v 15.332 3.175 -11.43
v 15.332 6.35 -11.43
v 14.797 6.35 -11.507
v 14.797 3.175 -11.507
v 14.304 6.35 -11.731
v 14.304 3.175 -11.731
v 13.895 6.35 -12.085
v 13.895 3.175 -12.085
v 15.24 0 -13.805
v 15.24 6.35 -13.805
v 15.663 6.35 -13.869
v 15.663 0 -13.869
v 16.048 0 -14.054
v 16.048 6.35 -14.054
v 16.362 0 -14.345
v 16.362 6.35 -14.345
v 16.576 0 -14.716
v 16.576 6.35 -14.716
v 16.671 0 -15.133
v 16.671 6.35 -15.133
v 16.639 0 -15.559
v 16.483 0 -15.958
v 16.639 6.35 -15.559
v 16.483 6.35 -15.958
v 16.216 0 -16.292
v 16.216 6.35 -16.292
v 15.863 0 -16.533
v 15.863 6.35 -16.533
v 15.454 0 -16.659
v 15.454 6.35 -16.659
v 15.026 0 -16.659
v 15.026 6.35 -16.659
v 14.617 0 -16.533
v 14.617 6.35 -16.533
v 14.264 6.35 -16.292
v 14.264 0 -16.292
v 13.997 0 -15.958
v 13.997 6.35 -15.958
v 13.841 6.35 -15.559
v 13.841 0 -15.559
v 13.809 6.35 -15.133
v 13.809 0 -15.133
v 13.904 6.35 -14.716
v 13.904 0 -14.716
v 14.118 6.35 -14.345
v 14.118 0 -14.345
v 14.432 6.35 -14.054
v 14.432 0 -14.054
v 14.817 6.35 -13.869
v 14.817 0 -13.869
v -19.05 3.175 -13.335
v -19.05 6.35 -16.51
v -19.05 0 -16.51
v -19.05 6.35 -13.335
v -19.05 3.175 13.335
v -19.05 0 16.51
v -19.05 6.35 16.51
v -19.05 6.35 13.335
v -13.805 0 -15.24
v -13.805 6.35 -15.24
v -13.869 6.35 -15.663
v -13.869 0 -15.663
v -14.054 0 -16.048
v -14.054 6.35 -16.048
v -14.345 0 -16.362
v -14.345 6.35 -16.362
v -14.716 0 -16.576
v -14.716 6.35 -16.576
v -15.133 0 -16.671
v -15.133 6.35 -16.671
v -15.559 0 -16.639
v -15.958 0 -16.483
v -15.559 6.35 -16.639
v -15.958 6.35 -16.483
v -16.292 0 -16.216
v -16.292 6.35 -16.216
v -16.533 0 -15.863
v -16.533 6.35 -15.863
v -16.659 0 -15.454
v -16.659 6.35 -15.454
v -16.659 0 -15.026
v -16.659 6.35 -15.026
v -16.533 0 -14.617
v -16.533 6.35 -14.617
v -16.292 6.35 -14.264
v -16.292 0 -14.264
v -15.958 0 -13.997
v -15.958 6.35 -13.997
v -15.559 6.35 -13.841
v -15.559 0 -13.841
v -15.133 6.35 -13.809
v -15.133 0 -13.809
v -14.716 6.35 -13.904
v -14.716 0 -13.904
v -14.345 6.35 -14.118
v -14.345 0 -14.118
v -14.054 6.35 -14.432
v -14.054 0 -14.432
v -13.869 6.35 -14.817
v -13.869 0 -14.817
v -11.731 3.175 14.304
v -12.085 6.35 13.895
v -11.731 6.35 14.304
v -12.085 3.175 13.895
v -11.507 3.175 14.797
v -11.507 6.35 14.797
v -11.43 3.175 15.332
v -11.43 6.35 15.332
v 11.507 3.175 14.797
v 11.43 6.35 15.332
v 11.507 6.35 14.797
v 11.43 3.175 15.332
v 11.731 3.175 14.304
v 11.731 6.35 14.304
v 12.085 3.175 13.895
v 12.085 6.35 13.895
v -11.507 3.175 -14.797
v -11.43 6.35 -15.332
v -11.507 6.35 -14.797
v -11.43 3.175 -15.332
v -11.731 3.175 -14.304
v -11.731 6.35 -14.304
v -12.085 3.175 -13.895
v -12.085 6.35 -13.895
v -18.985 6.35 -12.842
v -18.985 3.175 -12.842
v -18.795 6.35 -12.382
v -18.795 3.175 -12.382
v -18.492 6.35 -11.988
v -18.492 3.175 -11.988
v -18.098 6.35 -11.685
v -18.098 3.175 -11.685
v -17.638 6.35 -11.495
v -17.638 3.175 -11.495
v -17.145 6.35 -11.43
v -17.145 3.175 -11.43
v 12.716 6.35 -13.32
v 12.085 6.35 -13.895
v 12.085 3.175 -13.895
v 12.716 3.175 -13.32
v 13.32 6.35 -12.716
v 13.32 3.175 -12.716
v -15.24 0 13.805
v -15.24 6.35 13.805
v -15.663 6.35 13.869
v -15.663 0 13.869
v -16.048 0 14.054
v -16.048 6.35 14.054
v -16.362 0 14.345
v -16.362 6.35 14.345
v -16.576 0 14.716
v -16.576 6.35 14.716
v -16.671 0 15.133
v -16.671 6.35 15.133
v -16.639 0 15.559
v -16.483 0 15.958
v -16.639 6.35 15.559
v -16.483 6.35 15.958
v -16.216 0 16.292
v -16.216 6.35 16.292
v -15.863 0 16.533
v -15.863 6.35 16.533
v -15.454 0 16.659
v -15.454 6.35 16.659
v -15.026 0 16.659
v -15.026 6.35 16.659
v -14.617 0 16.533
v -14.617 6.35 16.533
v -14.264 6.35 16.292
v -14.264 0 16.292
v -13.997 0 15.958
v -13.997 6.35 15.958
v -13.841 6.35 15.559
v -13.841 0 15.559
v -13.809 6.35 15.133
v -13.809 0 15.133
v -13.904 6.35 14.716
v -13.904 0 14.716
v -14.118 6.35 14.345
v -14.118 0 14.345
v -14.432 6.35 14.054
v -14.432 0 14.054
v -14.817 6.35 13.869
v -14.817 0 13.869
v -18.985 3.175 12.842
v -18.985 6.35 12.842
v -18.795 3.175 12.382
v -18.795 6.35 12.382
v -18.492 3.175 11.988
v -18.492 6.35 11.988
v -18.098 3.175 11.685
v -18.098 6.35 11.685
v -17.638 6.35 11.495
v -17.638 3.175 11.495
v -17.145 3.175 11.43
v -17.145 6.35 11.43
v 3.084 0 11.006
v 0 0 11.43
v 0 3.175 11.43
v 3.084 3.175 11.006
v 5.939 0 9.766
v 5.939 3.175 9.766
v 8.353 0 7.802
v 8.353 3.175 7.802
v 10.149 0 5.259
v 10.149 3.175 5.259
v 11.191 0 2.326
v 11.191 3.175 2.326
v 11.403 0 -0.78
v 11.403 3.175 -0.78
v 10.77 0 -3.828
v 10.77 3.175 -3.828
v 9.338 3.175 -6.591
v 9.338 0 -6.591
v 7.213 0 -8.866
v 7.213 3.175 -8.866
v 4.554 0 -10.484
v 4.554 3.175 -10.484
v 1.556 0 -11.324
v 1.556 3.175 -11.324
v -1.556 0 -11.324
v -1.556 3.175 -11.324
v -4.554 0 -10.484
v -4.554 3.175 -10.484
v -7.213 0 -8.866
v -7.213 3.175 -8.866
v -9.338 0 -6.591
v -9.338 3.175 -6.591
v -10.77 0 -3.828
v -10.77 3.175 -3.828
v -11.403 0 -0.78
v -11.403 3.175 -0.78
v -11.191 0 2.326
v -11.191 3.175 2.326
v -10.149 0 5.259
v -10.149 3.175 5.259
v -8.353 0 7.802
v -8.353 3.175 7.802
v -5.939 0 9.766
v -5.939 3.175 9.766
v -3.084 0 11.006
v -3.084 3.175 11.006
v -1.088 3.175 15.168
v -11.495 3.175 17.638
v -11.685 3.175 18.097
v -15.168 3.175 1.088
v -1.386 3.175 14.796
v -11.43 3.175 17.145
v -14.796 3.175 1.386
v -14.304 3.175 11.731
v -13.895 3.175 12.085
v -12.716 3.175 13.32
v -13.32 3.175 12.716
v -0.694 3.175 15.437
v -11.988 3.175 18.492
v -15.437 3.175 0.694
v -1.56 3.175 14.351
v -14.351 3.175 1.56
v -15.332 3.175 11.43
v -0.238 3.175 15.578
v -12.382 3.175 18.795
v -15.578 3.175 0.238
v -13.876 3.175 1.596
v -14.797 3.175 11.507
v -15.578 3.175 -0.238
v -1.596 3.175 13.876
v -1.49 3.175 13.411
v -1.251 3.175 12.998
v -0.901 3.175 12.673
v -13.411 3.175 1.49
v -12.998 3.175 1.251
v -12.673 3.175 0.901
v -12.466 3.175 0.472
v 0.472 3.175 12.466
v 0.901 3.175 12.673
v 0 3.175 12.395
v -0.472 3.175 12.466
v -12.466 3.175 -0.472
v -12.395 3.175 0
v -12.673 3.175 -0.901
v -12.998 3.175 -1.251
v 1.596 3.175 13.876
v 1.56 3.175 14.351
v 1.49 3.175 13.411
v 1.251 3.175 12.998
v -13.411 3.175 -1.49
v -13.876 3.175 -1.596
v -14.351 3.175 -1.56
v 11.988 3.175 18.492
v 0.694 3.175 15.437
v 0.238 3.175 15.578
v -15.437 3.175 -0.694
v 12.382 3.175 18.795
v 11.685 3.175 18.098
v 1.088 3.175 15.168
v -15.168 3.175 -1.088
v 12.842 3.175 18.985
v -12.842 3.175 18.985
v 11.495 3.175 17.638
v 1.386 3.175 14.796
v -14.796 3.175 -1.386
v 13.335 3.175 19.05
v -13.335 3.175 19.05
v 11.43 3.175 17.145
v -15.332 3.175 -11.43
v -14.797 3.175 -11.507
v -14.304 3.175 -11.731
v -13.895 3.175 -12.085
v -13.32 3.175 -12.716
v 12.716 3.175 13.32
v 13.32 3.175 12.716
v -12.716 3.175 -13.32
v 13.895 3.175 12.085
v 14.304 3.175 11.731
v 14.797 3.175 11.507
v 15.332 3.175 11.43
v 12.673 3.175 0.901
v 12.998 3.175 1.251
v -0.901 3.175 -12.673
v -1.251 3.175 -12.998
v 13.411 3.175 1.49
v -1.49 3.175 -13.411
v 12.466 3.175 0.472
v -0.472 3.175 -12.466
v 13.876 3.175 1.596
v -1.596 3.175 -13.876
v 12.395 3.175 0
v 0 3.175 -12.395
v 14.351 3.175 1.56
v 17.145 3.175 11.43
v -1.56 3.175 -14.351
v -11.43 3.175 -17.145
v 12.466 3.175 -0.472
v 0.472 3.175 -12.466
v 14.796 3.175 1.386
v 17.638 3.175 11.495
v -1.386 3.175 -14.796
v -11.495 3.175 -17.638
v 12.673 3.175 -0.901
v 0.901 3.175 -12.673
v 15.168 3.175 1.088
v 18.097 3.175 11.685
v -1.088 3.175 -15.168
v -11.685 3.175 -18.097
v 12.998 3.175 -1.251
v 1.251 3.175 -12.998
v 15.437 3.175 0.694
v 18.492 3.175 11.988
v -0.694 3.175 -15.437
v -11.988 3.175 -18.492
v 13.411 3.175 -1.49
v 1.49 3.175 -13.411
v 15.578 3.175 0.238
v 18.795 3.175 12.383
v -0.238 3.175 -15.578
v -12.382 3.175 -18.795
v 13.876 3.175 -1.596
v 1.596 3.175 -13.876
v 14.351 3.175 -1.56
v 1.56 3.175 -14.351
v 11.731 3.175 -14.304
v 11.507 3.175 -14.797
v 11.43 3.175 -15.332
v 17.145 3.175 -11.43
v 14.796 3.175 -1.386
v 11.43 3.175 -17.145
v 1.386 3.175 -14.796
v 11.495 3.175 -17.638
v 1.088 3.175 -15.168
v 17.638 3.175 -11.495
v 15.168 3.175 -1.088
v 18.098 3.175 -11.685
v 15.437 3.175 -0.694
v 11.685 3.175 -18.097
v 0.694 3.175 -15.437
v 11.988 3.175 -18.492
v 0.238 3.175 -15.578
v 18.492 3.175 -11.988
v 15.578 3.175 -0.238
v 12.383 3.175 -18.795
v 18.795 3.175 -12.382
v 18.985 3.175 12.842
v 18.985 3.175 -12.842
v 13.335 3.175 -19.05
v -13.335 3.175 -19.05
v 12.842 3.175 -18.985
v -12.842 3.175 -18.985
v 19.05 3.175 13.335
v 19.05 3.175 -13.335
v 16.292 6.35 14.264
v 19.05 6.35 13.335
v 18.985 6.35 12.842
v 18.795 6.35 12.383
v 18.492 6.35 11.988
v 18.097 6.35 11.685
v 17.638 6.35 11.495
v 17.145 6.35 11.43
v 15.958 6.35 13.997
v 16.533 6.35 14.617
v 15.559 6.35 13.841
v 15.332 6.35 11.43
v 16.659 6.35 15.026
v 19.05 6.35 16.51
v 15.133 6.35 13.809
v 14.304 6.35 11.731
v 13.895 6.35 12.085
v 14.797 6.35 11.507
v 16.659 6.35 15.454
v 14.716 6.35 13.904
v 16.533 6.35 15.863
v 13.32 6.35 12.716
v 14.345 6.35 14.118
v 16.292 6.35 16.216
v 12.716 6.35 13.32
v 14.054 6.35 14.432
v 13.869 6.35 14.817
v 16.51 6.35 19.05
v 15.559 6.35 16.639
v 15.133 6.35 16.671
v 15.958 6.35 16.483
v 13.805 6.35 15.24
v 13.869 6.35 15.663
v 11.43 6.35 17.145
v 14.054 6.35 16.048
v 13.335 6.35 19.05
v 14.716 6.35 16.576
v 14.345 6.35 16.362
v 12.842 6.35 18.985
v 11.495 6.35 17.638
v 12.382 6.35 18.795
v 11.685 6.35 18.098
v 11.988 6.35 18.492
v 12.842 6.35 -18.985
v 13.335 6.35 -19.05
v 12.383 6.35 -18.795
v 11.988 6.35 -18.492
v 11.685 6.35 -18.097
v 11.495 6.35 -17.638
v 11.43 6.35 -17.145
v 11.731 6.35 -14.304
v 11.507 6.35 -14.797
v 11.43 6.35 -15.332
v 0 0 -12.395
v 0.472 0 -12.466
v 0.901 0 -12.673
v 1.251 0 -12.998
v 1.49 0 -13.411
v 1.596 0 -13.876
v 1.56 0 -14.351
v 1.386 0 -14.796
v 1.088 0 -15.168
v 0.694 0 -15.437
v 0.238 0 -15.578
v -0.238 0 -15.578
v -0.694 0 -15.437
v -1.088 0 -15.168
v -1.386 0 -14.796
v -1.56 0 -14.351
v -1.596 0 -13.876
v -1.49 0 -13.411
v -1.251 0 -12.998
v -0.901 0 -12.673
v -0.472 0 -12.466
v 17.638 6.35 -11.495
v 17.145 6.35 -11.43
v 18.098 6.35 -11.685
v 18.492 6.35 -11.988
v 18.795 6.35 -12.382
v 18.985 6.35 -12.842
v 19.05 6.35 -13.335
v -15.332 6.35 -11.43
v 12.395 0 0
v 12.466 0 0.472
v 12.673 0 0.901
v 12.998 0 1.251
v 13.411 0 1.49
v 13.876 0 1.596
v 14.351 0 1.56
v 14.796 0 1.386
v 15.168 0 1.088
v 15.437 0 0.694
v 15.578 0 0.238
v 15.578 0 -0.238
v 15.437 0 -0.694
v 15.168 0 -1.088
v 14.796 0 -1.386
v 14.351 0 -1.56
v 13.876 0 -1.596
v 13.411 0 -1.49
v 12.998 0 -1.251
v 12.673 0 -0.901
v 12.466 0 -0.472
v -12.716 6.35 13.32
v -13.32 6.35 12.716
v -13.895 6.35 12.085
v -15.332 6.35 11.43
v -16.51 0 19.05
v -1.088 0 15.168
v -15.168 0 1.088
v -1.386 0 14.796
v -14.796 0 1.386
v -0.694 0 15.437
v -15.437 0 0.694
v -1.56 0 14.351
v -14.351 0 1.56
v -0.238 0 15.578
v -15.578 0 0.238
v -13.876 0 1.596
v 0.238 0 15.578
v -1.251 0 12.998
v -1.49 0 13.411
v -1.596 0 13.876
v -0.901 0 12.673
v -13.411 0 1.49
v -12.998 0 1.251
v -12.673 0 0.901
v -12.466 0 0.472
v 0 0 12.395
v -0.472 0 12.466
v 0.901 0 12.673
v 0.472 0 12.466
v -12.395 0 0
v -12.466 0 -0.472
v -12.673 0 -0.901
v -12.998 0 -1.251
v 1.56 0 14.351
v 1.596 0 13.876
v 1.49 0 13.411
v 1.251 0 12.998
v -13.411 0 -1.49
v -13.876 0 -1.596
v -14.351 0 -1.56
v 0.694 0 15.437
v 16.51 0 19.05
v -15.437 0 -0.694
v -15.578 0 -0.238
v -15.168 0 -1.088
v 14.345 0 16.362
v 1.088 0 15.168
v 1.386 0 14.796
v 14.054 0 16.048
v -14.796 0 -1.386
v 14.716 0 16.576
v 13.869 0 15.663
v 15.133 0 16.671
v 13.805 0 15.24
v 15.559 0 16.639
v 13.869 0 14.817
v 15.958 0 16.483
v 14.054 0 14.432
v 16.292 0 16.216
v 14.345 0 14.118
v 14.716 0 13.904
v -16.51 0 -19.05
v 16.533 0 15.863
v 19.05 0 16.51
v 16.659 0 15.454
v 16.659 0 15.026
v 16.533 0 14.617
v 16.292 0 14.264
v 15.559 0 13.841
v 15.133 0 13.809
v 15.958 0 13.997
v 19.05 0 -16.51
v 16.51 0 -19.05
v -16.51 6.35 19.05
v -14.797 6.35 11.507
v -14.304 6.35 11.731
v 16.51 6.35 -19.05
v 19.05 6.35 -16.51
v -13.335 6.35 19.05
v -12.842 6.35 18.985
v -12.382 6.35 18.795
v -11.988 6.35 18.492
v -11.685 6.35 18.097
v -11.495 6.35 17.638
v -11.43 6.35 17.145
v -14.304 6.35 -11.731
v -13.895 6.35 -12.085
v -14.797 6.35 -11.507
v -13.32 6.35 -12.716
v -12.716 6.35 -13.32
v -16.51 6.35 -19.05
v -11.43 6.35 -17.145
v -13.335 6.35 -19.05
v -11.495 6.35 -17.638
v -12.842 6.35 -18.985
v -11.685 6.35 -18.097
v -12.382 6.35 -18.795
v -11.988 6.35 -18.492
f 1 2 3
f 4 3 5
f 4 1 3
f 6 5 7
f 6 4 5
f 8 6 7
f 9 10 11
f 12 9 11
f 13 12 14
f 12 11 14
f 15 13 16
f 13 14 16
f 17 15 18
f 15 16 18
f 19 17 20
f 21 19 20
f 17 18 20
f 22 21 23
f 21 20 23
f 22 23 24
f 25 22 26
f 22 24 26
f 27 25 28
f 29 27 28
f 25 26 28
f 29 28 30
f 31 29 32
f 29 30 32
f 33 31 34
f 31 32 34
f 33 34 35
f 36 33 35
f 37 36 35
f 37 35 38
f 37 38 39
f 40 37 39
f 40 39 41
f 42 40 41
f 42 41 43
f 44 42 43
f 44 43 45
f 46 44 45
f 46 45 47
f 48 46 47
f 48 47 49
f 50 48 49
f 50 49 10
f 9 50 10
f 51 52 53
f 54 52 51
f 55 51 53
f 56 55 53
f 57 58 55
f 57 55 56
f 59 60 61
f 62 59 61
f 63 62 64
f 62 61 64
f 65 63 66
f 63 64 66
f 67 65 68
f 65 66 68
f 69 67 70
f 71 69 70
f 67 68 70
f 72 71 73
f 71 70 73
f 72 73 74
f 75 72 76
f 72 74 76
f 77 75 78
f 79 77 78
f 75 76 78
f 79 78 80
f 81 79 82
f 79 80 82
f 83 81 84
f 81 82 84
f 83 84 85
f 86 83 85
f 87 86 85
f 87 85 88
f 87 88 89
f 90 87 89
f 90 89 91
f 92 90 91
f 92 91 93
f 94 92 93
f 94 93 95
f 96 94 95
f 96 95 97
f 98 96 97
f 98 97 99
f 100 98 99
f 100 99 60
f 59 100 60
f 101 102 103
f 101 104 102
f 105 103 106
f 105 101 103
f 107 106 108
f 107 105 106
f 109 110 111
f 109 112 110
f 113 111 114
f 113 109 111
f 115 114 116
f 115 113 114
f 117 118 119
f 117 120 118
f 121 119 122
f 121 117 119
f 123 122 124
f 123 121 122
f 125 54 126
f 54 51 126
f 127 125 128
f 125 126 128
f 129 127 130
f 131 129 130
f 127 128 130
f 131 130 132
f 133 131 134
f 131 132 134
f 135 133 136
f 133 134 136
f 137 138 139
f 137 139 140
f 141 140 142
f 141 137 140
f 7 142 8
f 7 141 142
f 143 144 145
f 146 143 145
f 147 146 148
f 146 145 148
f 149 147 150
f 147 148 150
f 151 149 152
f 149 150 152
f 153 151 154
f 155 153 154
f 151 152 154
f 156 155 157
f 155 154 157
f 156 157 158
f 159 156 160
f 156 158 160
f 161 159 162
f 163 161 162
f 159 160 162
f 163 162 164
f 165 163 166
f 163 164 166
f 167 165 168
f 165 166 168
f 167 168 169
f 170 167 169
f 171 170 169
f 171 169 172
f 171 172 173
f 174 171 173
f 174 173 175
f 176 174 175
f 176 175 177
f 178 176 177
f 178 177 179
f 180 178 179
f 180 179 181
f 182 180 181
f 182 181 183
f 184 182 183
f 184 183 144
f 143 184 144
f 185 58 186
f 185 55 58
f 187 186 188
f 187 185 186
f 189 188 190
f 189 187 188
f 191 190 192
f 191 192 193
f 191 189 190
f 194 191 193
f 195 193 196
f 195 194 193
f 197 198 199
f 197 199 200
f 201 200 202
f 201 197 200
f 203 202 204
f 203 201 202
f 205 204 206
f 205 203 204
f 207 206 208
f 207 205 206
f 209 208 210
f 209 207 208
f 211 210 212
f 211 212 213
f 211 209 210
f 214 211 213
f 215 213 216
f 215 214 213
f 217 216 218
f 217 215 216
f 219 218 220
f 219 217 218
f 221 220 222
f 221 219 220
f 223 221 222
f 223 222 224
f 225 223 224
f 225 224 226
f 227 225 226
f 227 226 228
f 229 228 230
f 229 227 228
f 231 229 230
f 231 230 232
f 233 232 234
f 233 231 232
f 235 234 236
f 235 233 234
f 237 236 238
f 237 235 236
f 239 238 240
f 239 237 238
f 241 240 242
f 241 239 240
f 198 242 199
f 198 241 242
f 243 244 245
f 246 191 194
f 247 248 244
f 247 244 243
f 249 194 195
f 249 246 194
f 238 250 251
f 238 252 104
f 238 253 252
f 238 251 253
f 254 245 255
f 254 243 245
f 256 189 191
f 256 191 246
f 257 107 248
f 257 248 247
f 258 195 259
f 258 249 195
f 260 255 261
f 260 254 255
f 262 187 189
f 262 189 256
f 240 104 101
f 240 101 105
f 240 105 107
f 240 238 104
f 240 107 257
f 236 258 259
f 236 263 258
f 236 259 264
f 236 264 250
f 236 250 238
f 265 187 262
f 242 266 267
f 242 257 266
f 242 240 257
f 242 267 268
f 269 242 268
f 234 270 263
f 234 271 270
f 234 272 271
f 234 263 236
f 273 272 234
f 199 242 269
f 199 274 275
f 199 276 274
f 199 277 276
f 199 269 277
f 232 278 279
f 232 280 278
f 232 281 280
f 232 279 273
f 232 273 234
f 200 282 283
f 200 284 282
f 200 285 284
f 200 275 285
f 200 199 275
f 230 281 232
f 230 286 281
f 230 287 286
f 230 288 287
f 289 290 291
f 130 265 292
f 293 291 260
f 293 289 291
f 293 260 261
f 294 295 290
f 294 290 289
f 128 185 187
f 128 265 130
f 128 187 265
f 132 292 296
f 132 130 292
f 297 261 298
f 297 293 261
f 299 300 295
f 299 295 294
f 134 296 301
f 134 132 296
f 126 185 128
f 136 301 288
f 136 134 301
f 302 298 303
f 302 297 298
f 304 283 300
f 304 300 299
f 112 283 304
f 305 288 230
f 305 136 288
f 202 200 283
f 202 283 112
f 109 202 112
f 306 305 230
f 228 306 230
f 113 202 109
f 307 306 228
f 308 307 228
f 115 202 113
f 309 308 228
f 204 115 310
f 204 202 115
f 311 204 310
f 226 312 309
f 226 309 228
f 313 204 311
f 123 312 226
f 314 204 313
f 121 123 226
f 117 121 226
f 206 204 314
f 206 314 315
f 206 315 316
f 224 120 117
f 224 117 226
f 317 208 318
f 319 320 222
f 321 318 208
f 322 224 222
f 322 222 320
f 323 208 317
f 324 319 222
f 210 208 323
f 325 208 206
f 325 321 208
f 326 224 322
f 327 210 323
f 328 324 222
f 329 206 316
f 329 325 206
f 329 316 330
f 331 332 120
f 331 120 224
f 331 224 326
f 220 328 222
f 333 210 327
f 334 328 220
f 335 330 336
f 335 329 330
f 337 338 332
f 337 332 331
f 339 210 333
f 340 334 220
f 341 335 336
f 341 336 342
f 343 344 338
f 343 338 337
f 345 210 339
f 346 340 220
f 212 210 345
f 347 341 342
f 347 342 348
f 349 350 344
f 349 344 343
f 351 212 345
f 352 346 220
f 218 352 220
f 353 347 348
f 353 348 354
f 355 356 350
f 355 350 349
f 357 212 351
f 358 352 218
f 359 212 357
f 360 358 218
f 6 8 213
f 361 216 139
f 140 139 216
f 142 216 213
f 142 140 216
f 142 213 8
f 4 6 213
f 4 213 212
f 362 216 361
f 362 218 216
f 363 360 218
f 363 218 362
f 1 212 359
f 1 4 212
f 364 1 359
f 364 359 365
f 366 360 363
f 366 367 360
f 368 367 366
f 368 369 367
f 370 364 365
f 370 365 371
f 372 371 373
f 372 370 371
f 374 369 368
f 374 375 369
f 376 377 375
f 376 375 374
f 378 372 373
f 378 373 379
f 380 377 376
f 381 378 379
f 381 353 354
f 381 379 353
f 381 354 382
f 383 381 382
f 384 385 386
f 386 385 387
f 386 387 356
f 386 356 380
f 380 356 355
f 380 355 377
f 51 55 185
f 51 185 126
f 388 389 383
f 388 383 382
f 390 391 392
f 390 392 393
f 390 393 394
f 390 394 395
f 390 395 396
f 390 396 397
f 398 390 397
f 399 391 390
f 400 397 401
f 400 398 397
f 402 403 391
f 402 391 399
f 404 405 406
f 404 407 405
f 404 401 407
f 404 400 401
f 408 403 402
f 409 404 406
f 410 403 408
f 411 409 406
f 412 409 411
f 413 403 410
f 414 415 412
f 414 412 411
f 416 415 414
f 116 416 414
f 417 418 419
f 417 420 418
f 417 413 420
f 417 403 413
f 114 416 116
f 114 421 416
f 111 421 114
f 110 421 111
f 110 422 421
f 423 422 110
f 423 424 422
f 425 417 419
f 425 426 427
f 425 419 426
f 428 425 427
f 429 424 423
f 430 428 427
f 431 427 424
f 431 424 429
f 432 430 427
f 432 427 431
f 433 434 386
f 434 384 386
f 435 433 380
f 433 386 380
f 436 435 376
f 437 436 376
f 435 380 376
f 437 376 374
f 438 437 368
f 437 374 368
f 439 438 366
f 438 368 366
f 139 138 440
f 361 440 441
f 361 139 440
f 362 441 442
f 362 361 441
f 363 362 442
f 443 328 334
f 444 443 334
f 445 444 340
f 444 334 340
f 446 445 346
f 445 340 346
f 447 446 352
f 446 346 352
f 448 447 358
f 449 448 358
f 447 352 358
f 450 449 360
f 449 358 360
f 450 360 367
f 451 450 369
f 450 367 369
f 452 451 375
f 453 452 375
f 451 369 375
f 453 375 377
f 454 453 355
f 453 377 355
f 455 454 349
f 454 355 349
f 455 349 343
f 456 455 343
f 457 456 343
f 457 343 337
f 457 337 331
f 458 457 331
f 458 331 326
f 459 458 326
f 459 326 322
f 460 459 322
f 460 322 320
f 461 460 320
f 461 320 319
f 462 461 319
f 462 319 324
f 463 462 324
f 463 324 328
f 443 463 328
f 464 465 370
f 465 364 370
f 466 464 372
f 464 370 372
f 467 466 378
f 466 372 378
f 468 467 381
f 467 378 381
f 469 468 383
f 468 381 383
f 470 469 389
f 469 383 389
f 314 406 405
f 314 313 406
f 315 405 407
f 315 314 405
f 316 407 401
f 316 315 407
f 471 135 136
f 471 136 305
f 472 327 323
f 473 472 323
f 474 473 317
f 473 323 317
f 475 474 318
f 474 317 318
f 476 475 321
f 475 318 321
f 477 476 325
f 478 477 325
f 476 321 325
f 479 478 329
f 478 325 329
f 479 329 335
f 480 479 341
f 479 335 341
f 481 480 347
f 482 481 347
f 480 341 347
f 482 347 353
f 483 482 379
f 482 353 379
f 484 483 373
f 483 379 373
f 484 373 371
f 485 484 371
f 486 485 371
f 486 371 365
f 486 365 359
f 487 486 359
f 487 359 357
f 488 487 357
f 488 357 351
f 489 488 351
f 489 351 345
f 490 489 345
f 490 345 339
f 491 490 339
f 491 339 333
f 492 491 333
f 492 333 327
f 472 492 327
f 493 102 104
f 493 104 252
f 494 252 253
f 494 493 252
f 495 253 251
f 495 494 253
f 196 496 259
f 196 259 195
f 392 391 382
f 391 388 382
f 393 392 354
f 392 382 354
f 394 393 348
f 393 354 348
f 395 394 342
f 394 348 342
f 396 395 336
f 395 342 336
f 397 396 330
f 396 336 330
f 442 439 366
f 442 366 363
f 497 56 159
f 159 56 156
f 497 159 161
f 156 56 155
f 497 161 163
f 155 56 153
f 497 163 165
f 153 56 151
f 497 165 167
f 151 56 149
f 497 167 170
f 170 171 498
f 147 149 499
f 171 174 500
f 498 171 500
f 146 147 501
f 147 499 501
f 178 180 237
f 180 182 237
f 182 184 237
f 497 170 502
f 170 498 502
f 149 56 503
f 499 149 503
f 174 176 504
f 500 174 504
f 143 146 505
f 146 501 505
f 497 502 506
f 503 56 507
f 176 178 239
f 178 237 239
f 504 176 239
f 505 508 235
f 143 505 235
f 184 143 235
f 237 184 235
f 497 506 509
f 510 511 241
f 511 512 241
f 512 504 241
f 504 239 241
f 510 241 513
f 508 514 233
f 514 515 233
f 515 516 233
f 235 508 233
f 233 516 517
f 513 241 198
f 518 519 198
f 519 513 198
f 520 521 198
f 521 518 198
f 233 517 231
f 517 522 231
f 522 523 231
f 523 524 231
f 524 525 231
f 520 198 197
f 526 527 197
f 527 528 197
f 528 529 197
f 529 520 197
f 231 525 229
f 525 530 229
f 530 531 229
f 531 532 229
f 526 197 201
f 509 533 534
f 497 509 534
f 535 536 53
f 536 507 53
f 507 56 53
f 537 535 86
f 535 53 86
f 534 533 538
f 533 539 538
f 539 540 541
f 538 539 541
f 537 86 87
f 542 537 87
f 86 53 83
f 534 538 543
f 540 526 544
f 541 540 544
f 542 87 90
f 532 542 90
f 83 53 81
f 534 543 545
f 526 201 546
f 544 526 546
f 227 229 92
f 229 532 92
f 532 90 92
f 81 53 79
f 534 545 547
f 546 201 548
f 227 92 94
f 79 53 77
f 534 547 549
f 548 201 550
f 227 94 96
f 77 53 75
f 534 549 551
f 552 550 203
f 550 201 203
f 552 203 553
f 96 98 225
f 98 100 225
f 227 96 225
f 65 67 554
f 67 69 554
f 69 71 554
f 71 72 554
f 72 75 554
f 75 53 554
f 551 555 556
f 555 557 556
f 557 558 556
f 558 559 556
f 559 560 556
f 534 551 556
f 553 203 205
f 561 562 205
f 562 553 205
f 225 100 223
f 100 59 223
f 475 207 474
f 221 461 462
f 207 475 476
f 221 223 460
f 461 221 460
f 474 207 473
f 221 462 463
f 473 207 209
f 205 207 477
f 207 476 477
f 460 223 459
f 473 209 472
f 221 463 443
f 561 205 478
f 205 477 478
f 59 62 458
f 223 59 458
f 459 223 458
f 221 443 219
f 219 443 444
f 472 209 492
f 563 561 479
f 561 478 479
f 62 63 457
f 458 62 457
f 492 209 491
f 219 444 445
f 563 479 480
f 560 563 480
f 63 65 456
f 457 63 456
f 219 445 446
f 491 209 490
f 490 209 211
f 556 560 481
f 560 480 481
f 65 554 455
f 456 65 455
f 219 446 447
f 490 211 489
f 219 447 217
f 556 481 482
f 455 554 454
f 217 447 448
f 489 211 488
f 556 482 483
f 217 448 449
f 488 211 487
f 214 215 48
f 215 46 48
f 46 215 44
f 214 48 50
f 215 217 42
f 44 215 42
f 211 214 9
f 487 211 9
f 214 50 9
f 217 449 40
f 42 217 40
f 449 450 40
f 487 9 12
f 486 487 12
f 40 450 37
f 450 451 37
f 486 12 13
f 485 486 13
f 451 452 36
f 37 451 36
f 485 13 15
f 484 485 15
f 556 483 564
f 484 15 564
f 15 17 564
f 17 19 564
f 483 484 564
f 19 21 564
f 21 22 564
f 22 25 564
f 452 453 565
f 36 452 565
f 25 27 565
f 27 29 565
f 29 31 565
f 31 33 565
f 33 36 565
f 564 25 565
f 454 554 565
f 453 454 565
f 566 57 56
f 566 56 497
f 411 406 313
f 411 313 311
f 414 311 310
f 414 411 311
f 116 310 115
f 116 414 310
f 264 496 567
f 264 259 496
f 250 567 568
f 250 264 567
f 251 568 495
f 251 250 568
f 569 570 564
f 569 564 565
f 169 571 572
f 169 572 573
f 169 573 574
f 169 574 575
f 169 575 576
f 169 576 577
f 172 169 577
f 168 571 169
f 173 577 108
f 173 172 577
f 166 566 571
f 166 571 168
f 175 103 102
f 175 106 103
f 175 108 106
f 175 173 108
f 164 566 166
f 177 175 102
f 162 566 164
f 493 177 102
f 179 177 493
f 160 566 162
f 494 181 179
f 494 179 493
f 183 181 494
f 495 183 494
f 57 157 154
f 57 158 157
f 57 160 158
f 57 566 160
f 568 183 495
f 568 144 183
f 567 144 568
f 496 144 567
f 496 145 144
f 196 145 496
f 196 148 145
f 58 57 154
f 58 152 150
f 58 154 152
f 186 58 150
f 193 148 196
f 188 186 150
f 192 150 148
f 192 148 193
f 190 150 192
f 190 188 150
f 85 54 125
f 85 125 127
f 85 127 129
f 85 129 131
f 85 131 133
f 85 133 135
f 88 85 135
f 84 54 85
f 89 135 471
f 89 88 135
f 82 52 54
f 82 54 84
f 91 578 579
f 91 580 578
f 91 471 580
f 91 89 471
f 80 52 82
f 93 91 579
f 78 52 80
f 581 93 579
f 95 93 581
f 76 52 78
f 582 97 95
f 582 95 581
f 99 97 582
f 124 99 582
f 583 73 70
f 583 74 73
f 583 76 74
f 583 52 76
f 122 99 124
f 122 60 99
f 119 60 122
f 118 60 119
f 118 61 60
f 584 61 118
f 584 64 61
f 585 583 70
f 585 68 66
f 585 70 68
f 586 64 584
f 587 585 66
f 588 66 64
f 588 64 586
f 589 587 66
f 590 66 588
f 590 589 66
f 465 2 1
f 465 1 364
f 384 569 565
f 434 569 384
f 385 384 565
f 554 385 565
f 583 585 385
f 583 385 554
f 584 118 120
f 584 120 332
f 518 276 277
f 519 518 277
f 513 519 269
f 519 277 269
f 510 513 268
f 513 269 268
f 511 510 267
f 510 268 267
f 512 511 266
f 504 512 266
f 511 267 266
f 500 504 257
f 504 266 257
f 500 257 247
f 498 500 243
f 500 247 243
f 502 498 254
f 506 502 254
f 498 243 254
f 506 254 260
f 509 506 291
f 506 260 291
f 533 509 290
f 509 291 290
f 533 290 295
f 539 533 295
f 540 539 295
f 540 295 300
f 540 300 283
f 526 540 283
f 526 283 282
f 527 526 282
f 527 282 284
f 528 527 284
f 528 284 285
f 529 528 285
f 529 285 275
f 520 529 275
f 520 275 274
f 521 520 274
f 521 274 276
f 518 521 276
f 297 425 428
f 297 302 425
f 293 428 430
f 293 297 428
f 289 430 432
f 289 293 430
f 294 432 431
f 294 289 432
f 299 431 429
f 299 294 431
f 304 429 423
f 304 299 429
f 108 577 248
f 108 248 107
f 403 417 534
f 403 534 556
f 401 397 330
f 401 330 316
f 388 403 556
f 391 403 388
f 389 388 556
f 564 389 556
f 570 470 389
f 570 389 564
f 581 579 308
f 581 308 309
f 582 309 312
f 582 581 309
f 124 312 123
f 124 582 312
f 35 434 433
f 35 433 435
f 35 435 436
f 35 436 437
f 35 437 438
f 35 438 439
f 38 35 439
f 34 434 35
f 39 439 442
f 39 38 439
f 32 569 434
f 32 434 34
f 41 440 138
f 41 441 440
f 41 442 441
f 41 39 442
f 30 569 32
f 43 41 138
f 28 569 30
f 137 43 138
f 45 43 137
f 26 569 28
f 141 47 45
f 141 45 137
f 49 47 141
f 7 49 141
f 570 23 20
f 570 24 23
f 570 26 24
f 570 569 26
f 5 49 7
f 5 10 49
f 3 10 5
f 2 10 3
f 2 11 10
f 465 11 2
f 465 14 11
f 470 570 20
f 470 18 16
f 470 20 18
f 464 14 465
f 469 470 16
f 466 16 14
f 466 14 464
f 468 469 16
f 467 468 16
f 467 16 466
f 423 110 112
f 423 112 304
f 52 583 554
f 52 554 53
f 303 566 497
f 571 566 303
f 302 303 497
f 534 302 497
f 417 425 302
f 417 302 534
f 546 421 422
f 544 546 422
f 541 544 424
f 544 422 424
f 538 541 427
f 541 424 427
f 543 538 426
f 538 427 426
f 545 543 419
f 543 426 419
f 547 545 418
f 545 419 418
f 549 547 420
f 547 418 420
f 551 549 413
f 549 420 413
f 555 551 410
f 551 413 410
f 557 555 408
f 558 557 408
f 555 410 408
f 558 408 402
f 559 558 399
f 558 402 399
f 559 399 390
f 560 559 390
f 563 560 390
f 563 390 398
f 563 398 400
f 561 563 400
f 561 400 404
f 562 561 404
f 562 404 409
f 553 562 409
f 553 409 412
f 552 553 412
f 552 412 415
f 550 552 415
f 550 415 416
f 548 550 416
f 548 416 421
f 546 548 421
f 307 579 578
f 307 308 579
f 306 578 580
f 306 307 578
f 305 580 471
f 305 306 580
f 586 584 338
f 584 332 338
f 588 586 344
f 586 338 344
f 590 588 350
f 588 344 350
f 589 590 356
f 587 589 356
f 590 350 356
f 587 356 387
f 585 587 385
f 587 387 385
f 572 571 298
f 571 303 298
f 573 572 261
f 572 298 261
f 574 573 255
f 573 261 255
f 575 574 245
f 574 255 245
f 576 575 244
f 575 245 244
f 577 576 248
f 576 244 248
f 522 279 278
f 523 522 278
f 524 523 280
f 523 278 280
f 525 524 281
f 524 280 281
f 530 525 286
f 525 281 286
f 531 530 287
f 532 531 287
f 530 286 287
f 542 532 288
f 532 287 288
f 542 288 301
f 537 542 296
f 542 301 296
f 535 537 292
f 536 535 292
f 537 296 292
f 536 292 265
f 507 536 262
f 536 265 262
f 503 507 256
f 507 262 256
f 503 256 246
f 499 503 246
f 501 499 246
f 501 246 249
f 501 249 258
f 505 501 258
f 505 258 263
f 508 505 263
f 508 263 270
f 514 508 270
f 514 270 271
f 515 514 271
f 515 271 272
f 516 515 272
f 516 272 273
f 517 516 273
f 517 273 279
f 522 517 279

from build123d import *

# Parameters (mm, degrees)
SKETCH1_W                = 38.1
SKETCH1_H                = 38.1
SKETCH1_R                = 11.43
BOSS_EXTRUDE1_DEPTH      = 3.175
SKETCH2_R                = 1.6002
SKETCH2_R_2              = 1.4351
CUT_EXTRUDE1_DEPTH       = 28.127211891
CIRPATTERN1_COUNT        = 4
CHAMFER1_SIZE            = 2.54
BOSS_EXTRUDE2_START      = 3.175
SKETCH3_R                = 1.4351
BOSS_EXTRUDE2_DEPTH      = 3.175
FILLET1_R                = 1.905
CIRPATTERN7_COUNT        = 4
FILLET1_OF_CIRPATTERN7_R = 1.905


with BuildPart() as part:
    # Sketch1 → Boss-Extrude1 (new body)
    with BuildSketch(Plane(origin=(0, 0, 0), x_dir=(1, 0, 0), z_dir=(0, 1, 0))):
        Rectangle(SKETCH1_W, SKETCH1_H)
        Circle(SKETCH1_R, mode=Mode.SUBTRACT)
    extrude(amount=BOSS_EXTRUDE1_DEPTH)

    # Sketch2 → Cut-Extrude1 (cut, through all)
    with BuildSketch(Plane(origin=(0, 3.175, 0), x_dir=(1, 0, 0), z_dir=(0, 1, 0))):
        with Locations((0, 13.9954)):
            Circle(SKETCH2_R)
        with Locations((15.24, 15.24)):
            Circle(SKETCH2_R_2)
    cut_extrude1 = extrude(amount=-CUT_EXTRUDE1_DEPTH, mode=Mode.SUBTRACT)

    # CirPattern1: Cut-Extrude1 ×4 about axis
    cirpattern1_axis = Axis((0, 3.175, 0), (0, -1, 0))
    for i in range(1, CIRPATTERN1_COUNT):
        add(cut_extrude1.rotate(cirpattern1_axis, i * 360 / CIRPATTERN1_COUNT), mode=Mode.SUBTRACT)

    # Chamfer1
    chamfer1_edges = [part.edges().sort_by_distance(p)[0] for p in [
        (-19.05, 1.5875, 19.05),
        (19.05, 1.5875, 19.05),
        (19.05, 1.5875, -19.05),
        (-19.05, 1.5875, -19.05),
    ]]
    chamfer(chamfer1_edges, length=CHAMFER1_SIZE)

    # Sketch3 → Boss-Extrude2 (add)
    with BuildSketch(Plane(origin=(0, 3.175, 0), x_dir=(1, 0, 0), z_dir=(0, 1, 0)).offset(BOSS_EXTRUDE2_START)):
        with BuildLine():
            Line((-19.05, 16.51), (-19.05, 11.43))
            Line((-19.05, 11.43), (-14.438397591, 11.43))
            ThreePointArc((-14.438397591, 11.43), (-13.021371376, 13.021371376), (-11.43, 14.438397591))
            Line((-11.43, 14.438397591), (-11.43, 19.05))
            Line((-11.43, 19.05), (-16.51, 19.05))
            Line((-16.51, 19.05), (-19.05, 16.51))
        make_face()
        with Locations((-15.24, 15.24)):
            Circle(SKETCH3_R, mode=Mode.SUBTRACT)
    boss_extrude2 = extrude(amount=-BOSS_EXTRUDE2_DEPTH)

    # Fillet1
    fillet1_edges = [part.edges().sort_by_distance(p)[0] for p in [
        (-19.05, 4.7625, -11.43),
        (-11.43, 4.7625, -19.05),
        (-11.43, 4.7625, -14.438397591),
        (-14.438397591, 4.7625, -11.43),
    ]]
    fillet(fillet1_edges, radius=FILLET1_R)

    # CirPattern7: Boss-Extrude2 ×4 about axis
    cirpattern7_axis = Axis((0, 3.175, 0), (0, -1, 0))
    for i in range(1, CIRPATTERN7_COUNT):
        add(boss_extrude2.rotate(cirpattern7_axis, i * 360 / CIRPATTERN7_COUNT))

    # Fillet1 of CirPattern7
    fillet1_of_cirpattern7_edges = [part.edges().sort_by_distance(p)[0] for p in [
        (11.43, 4.7625, -19.05),
        (19.05, 4.7625, -11.43),
        (14.438397591, 4.7625, -11.43),
        (11.43, 4.7625, -14.438397591),
        (19.05, 4.7625, 11.43),
        (11.43, 4.7625, 19.05),
        (11.43, 4.7625, 14.438397591),
        (14.438397591, 4.7625, 11.43),
        (-11.43, 4.7625, 19.05),
        (-19.05, 4.7625, 11.43),
        (-14.438397591, 4.7625, 11.43),
        (-11.43, 4.7625, 14.438397591),
    ]]
    fillet(fillet1_of_cirpattern7_edges, radius=FILLET1_OF_CIRPATTERN7_R)


solid = part.part
